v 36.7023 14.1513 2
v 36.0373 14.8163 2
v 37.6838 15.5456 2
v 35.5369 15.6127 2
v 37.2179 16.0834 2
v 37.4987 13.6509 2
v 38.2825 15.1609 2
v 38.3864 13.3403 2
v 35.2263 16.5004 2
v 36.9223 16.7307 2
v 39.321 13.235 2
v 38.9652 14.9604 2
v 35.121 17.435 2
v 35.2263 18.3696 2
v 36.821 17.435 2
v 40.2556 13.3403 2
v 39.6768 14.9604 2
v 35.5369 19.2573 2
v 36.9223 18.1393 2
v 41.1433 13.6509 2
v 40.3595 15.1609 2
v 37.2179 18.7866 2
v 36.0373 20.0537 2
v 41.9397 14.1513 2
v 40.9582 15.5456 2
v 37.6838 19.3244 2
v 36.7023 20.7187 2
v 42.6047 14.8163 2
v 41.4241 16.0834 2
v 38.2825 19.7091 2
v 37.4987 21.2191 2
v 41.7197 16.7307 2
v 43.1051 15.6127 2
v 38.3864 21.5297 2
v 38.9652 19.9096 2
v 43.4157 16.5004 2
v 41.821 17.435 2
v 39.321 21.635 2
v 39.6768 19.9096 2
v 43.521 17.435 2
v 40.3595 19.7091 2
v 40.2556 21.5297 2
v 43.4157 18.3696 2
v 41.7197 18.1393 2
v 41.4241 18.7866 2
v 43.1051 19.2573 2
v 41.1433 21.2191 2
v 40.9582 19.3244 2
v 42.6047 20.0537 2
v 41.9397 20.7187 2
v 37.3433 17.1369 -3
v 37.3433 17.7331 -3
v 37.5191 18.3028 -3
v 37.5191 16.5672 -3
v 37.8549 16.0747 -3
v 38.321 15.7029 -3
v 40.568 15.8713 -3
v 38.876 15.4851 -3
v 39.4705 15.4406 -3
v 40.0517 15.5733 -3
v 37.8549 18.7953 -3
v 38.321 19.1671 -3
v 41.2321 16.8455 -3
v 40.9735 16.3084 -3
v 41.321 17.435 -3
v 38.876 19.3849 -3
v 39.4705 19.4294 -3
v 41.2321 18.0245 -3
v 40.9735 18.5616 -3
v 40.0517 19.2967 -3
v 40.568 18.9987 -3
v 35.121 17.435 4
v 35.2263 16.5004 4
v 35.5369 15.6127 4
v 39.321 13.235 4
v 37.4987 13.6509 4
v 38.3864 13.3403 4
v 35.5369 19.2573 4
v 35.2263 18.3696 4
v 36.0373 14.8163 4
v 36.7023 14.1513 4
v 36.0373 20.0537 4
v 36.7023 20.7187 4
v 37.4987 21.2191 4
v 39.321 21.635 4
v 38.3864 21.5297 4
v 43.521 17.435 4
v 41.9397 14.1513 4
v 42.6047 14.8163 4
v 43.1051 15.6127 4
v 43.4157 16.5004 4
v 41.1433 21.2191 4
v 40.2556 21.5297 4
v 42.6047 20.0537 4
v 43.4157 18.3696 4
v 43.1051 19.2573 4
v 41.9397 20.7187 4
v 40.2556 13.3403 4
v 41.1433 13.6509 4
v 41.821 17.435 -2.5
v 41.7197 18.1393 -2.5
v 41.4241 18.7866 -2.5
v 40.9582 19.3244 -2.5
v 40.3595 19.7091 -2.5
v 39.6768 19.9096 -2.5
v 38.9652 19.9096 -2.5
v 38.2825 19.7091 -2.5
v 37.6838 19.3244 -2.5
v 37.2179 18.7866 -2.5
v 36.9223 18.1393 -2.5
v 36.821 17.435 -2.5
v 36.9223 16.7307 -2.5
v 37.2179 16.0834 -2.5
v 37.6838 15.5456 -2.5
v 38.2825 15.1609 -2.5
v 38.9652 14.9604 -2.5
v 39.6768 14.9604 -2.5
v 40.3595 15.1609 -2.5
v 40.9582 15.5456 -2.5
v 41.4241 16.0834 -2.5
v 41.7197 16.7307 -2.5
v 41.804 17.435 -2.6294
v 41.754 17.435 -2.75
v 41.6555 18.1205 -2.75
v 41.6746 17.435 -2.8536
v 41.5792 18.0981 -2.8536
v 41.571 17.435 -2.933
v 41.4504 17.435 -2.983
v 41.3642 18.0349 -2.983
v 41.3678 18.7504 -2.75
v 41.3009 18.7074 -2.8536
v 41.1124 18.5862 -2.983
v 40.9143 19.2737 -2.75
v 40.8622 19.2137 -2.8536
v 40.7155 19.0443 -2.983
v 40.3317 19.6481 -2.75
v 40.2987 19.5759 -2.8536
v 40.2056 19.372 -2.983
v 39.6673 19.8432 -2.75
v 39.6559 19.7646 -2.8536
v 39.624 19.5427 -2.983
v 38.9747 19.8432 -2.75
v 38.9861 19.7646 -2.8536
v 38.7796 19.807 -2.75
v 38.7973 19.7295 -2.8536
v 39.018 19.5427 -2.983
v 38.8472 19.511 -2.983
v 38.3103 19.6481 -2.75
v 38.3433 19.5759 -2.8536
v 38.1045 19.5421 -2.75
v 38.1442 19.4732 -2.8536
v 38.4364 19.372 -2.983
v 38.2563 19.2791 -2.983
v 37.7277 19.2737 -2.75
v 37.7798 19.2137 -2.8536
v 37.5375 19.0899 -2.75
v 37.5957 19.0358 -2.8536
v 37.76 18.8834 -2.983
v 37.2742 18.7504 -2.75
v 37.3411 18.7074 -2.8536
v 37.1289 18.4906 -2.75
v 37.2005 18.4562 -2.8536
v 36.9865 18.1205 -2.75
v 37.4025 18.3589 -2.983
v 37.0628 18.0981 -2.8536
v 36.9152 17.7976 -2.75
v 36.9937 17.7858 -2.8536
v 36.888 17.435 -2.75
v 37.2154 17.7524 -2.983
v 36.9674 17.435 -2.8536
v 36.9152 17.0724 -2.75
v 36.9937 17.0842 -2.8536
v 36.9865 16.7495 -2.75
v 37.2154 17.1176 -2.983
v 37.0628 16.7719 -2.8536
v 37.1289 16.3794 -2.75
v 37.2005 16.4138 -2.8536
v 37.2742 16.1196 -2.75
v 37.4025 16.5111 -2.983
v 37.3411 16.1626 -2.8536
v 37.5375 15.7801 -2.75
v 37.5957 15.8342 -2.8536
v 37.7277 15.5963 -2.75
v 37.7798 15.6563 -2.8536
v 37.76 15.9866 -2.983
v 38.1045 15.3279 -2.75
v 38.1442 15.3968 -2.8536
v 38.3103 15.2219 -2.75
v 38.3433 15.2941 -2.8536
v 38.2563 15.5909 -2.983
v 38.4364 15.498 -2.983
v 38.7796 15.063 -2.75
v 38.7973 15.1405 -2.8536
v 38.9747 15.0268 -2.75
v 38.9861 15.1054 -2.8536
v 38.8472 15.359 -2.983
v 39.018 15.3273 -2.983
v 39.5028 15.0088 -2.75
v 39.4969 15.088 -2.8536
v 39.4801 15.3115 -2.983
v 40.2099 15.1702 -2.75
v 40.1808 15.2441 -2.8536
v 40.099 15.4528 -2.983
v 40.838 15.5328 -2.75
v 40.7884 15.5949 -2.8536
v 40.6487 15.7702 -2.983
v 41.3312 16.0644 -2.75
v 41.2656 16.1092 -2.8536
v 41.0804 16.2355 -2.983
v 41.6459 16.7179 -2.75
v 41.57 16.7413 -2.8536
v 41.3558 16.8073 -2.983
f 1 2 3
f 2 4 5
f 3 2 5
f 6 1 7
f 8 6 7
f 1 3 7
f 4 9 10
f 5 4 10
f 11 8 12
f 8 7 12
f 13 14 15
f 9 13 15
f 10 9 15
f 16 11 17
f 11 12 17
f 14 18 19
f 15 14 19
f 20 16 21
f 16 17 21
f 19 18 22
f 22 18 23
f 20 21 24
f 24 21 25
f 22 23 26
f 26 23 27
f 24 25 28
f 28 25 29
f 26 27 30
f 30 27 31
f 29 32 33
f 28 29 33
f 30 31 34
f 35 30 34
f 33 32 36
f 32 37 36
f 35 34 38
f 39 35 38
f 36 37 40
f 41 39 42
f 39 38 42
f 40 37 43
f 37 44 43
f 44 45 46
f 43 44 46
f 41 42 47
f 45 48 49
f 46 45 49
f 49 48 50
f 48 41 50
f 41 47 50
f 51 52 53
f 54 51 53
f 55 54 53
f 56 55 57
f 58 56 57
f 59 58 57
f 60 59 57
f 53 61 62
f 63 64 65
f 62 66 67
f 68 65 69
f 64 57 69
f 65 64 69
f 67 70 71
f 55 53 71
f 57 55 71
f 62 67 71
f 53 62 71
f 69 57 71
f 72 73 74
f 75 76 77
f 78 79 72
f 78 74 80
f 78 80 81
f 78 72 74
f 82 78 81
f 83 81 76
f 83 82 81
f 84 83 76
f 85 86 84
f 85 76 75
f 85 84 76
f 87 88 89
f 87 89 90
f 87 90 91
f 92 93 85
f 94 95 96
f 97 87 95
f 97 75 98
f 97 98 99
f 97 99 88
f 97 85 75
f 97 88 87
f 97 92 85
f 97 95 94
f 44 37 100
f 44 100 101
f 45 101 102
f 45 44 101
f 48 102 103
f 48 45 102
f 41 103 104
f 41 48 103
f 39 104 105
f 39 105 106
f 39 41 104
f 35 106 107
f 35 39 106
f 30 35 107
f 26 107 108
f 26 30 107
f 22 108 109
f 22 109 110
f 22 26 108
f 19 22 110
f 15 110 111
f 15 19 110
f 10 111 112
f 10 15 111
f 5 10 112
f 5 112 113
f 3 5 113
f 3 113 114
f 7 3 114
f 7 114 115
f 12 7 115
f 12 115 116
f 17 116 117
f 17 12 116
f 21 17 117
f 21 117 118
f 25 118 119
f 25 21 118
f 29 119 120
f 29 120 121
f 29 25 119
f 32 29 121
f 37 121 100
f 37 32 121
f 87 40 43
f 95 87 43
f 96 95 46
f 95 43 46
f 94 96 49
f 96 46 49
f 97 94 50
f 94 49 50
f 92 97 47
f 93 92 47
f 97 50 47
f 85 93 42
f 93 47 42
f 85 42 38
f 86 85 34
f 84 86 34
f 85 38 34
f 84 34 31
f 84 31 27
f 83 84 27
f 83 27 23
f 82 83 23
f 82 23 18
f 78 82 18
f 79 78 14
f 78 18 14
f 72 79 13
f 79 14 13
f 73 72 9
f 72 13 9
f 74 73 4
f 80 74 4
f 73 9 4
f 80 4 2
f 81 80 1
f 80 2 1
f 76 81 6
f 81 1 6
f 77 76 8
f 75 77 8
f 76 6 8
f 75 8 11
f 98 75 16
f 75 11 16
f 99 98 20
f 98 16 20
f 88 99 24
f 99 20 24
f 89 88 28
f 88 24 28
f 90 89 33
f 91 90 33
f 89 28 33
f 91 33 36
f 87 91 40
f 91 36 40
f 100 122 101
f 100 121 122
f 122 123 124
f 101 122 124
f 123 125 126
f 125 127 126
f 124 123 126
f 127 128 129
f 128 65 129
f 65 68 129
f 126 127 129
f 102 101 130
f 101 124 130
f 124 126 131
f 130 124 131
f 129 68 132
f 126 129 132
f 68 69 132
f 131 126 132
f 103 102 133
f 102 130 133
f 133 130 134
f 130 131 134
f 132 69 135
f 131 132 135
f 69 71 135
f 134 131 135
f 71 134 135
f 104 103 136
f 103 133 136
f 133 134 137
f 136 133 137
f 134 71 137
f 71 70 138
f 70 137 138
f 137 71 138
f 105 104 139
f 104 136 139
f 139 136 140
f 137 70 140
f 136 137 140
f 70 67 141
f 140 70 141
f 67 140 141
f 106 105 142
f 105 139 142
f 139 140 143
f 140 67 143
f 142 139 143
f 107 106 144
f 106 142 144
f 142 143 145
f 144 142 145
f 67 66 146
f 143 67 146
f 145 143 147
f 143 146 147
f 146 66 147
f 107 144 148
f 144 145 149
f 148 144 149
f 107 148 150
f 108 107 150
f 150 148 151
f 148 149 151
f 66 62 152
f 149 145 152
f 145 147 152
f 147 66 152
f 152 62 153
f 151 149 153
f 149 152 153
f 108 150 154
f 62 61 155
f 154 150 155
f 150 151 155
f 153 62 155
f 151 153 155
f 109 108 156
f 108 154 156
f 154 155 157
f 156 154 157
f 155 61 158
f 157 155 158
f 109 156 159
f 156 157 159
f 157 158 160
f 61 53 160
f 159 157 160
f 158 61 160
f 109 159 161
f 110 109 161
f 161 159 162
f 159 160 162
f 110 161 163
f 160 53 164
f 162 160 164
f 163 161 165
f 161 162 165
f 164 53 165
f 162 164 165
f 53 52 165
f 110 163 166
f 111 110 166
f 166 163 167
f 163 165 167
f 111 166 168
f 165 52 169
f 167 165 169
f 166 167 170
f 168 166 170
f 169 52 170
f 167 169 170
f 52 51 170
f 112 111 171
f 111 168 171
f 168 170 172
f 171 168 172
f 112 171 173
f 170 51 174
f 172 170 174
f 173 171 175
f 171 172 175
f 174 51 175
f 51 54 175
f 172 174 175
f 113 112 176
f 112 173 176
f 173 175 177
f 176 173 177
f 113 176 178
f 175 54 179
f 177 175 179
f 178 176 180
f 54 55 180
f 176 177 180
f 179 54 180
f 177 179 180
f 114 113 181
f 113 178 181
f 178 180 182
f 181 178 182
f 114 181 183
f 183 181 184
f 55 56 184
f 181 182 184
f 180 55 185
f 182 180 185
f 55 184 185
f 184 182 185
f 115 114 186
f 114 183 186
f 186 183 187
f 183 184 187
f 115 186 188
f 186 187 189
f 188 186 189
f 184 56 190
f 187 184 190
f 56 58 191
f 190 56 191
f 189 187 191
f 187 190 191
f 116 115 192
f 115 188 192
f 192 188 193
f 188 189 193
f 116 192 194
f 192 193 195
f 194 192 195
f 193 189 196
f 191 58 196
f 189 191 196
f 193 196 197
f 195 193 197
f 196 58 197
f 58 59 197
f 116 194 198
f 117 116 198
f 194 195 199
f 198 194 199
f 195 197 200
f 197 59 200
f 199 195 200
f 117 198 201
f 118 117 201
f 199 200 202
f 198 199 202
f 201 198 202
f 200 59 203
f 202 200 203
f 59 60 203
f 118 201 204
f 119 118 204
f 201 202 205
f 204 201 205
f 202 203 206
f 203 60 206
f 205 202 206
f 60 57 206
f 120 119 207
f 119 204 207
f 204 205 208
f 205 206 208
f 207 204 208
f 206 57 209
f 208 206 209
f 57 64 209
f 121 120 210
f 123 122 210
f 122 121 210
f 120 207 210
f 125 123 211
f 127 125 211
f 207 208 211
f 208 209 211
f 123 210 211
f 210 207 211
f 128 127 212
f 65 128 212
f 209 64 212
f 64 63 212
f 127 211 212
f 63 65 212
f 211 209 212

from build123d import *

# Parameters (mm, degrees)
SKETCH004_R  = 2.5
PAD004_DEPTH = 5
SKETCH005_R  = 4.2
PAD005_DEPTH = 2
FILLET_R     = 0.5


with BuildPart() as part:
    # Sketch004 → Pad004 (new body)
    with BuildSketch(Plane.XY.offset(2)):
        with Locations((39.321, 17.435)):
            Circle(SKETCH004_R)
    extrude(amount=-PAD004_DEPTH)

    # Sketch005 → Pad005 (join)
    with BuildSketch(Plane.XY.offset(2)):
        with Locations((39.321, 17.435)):
            Circle(SKETCH005_R)
    extrude(amount=PAD005_DEPTH)

    # Fillet
    fillet_edges = [part.edges().sort_by_distance(p)[0] for p in [
        (36.821, 17.435, -3),
    ]]
    fillet(fillet_edges, radius=FILLET_R)


solid = part.part
